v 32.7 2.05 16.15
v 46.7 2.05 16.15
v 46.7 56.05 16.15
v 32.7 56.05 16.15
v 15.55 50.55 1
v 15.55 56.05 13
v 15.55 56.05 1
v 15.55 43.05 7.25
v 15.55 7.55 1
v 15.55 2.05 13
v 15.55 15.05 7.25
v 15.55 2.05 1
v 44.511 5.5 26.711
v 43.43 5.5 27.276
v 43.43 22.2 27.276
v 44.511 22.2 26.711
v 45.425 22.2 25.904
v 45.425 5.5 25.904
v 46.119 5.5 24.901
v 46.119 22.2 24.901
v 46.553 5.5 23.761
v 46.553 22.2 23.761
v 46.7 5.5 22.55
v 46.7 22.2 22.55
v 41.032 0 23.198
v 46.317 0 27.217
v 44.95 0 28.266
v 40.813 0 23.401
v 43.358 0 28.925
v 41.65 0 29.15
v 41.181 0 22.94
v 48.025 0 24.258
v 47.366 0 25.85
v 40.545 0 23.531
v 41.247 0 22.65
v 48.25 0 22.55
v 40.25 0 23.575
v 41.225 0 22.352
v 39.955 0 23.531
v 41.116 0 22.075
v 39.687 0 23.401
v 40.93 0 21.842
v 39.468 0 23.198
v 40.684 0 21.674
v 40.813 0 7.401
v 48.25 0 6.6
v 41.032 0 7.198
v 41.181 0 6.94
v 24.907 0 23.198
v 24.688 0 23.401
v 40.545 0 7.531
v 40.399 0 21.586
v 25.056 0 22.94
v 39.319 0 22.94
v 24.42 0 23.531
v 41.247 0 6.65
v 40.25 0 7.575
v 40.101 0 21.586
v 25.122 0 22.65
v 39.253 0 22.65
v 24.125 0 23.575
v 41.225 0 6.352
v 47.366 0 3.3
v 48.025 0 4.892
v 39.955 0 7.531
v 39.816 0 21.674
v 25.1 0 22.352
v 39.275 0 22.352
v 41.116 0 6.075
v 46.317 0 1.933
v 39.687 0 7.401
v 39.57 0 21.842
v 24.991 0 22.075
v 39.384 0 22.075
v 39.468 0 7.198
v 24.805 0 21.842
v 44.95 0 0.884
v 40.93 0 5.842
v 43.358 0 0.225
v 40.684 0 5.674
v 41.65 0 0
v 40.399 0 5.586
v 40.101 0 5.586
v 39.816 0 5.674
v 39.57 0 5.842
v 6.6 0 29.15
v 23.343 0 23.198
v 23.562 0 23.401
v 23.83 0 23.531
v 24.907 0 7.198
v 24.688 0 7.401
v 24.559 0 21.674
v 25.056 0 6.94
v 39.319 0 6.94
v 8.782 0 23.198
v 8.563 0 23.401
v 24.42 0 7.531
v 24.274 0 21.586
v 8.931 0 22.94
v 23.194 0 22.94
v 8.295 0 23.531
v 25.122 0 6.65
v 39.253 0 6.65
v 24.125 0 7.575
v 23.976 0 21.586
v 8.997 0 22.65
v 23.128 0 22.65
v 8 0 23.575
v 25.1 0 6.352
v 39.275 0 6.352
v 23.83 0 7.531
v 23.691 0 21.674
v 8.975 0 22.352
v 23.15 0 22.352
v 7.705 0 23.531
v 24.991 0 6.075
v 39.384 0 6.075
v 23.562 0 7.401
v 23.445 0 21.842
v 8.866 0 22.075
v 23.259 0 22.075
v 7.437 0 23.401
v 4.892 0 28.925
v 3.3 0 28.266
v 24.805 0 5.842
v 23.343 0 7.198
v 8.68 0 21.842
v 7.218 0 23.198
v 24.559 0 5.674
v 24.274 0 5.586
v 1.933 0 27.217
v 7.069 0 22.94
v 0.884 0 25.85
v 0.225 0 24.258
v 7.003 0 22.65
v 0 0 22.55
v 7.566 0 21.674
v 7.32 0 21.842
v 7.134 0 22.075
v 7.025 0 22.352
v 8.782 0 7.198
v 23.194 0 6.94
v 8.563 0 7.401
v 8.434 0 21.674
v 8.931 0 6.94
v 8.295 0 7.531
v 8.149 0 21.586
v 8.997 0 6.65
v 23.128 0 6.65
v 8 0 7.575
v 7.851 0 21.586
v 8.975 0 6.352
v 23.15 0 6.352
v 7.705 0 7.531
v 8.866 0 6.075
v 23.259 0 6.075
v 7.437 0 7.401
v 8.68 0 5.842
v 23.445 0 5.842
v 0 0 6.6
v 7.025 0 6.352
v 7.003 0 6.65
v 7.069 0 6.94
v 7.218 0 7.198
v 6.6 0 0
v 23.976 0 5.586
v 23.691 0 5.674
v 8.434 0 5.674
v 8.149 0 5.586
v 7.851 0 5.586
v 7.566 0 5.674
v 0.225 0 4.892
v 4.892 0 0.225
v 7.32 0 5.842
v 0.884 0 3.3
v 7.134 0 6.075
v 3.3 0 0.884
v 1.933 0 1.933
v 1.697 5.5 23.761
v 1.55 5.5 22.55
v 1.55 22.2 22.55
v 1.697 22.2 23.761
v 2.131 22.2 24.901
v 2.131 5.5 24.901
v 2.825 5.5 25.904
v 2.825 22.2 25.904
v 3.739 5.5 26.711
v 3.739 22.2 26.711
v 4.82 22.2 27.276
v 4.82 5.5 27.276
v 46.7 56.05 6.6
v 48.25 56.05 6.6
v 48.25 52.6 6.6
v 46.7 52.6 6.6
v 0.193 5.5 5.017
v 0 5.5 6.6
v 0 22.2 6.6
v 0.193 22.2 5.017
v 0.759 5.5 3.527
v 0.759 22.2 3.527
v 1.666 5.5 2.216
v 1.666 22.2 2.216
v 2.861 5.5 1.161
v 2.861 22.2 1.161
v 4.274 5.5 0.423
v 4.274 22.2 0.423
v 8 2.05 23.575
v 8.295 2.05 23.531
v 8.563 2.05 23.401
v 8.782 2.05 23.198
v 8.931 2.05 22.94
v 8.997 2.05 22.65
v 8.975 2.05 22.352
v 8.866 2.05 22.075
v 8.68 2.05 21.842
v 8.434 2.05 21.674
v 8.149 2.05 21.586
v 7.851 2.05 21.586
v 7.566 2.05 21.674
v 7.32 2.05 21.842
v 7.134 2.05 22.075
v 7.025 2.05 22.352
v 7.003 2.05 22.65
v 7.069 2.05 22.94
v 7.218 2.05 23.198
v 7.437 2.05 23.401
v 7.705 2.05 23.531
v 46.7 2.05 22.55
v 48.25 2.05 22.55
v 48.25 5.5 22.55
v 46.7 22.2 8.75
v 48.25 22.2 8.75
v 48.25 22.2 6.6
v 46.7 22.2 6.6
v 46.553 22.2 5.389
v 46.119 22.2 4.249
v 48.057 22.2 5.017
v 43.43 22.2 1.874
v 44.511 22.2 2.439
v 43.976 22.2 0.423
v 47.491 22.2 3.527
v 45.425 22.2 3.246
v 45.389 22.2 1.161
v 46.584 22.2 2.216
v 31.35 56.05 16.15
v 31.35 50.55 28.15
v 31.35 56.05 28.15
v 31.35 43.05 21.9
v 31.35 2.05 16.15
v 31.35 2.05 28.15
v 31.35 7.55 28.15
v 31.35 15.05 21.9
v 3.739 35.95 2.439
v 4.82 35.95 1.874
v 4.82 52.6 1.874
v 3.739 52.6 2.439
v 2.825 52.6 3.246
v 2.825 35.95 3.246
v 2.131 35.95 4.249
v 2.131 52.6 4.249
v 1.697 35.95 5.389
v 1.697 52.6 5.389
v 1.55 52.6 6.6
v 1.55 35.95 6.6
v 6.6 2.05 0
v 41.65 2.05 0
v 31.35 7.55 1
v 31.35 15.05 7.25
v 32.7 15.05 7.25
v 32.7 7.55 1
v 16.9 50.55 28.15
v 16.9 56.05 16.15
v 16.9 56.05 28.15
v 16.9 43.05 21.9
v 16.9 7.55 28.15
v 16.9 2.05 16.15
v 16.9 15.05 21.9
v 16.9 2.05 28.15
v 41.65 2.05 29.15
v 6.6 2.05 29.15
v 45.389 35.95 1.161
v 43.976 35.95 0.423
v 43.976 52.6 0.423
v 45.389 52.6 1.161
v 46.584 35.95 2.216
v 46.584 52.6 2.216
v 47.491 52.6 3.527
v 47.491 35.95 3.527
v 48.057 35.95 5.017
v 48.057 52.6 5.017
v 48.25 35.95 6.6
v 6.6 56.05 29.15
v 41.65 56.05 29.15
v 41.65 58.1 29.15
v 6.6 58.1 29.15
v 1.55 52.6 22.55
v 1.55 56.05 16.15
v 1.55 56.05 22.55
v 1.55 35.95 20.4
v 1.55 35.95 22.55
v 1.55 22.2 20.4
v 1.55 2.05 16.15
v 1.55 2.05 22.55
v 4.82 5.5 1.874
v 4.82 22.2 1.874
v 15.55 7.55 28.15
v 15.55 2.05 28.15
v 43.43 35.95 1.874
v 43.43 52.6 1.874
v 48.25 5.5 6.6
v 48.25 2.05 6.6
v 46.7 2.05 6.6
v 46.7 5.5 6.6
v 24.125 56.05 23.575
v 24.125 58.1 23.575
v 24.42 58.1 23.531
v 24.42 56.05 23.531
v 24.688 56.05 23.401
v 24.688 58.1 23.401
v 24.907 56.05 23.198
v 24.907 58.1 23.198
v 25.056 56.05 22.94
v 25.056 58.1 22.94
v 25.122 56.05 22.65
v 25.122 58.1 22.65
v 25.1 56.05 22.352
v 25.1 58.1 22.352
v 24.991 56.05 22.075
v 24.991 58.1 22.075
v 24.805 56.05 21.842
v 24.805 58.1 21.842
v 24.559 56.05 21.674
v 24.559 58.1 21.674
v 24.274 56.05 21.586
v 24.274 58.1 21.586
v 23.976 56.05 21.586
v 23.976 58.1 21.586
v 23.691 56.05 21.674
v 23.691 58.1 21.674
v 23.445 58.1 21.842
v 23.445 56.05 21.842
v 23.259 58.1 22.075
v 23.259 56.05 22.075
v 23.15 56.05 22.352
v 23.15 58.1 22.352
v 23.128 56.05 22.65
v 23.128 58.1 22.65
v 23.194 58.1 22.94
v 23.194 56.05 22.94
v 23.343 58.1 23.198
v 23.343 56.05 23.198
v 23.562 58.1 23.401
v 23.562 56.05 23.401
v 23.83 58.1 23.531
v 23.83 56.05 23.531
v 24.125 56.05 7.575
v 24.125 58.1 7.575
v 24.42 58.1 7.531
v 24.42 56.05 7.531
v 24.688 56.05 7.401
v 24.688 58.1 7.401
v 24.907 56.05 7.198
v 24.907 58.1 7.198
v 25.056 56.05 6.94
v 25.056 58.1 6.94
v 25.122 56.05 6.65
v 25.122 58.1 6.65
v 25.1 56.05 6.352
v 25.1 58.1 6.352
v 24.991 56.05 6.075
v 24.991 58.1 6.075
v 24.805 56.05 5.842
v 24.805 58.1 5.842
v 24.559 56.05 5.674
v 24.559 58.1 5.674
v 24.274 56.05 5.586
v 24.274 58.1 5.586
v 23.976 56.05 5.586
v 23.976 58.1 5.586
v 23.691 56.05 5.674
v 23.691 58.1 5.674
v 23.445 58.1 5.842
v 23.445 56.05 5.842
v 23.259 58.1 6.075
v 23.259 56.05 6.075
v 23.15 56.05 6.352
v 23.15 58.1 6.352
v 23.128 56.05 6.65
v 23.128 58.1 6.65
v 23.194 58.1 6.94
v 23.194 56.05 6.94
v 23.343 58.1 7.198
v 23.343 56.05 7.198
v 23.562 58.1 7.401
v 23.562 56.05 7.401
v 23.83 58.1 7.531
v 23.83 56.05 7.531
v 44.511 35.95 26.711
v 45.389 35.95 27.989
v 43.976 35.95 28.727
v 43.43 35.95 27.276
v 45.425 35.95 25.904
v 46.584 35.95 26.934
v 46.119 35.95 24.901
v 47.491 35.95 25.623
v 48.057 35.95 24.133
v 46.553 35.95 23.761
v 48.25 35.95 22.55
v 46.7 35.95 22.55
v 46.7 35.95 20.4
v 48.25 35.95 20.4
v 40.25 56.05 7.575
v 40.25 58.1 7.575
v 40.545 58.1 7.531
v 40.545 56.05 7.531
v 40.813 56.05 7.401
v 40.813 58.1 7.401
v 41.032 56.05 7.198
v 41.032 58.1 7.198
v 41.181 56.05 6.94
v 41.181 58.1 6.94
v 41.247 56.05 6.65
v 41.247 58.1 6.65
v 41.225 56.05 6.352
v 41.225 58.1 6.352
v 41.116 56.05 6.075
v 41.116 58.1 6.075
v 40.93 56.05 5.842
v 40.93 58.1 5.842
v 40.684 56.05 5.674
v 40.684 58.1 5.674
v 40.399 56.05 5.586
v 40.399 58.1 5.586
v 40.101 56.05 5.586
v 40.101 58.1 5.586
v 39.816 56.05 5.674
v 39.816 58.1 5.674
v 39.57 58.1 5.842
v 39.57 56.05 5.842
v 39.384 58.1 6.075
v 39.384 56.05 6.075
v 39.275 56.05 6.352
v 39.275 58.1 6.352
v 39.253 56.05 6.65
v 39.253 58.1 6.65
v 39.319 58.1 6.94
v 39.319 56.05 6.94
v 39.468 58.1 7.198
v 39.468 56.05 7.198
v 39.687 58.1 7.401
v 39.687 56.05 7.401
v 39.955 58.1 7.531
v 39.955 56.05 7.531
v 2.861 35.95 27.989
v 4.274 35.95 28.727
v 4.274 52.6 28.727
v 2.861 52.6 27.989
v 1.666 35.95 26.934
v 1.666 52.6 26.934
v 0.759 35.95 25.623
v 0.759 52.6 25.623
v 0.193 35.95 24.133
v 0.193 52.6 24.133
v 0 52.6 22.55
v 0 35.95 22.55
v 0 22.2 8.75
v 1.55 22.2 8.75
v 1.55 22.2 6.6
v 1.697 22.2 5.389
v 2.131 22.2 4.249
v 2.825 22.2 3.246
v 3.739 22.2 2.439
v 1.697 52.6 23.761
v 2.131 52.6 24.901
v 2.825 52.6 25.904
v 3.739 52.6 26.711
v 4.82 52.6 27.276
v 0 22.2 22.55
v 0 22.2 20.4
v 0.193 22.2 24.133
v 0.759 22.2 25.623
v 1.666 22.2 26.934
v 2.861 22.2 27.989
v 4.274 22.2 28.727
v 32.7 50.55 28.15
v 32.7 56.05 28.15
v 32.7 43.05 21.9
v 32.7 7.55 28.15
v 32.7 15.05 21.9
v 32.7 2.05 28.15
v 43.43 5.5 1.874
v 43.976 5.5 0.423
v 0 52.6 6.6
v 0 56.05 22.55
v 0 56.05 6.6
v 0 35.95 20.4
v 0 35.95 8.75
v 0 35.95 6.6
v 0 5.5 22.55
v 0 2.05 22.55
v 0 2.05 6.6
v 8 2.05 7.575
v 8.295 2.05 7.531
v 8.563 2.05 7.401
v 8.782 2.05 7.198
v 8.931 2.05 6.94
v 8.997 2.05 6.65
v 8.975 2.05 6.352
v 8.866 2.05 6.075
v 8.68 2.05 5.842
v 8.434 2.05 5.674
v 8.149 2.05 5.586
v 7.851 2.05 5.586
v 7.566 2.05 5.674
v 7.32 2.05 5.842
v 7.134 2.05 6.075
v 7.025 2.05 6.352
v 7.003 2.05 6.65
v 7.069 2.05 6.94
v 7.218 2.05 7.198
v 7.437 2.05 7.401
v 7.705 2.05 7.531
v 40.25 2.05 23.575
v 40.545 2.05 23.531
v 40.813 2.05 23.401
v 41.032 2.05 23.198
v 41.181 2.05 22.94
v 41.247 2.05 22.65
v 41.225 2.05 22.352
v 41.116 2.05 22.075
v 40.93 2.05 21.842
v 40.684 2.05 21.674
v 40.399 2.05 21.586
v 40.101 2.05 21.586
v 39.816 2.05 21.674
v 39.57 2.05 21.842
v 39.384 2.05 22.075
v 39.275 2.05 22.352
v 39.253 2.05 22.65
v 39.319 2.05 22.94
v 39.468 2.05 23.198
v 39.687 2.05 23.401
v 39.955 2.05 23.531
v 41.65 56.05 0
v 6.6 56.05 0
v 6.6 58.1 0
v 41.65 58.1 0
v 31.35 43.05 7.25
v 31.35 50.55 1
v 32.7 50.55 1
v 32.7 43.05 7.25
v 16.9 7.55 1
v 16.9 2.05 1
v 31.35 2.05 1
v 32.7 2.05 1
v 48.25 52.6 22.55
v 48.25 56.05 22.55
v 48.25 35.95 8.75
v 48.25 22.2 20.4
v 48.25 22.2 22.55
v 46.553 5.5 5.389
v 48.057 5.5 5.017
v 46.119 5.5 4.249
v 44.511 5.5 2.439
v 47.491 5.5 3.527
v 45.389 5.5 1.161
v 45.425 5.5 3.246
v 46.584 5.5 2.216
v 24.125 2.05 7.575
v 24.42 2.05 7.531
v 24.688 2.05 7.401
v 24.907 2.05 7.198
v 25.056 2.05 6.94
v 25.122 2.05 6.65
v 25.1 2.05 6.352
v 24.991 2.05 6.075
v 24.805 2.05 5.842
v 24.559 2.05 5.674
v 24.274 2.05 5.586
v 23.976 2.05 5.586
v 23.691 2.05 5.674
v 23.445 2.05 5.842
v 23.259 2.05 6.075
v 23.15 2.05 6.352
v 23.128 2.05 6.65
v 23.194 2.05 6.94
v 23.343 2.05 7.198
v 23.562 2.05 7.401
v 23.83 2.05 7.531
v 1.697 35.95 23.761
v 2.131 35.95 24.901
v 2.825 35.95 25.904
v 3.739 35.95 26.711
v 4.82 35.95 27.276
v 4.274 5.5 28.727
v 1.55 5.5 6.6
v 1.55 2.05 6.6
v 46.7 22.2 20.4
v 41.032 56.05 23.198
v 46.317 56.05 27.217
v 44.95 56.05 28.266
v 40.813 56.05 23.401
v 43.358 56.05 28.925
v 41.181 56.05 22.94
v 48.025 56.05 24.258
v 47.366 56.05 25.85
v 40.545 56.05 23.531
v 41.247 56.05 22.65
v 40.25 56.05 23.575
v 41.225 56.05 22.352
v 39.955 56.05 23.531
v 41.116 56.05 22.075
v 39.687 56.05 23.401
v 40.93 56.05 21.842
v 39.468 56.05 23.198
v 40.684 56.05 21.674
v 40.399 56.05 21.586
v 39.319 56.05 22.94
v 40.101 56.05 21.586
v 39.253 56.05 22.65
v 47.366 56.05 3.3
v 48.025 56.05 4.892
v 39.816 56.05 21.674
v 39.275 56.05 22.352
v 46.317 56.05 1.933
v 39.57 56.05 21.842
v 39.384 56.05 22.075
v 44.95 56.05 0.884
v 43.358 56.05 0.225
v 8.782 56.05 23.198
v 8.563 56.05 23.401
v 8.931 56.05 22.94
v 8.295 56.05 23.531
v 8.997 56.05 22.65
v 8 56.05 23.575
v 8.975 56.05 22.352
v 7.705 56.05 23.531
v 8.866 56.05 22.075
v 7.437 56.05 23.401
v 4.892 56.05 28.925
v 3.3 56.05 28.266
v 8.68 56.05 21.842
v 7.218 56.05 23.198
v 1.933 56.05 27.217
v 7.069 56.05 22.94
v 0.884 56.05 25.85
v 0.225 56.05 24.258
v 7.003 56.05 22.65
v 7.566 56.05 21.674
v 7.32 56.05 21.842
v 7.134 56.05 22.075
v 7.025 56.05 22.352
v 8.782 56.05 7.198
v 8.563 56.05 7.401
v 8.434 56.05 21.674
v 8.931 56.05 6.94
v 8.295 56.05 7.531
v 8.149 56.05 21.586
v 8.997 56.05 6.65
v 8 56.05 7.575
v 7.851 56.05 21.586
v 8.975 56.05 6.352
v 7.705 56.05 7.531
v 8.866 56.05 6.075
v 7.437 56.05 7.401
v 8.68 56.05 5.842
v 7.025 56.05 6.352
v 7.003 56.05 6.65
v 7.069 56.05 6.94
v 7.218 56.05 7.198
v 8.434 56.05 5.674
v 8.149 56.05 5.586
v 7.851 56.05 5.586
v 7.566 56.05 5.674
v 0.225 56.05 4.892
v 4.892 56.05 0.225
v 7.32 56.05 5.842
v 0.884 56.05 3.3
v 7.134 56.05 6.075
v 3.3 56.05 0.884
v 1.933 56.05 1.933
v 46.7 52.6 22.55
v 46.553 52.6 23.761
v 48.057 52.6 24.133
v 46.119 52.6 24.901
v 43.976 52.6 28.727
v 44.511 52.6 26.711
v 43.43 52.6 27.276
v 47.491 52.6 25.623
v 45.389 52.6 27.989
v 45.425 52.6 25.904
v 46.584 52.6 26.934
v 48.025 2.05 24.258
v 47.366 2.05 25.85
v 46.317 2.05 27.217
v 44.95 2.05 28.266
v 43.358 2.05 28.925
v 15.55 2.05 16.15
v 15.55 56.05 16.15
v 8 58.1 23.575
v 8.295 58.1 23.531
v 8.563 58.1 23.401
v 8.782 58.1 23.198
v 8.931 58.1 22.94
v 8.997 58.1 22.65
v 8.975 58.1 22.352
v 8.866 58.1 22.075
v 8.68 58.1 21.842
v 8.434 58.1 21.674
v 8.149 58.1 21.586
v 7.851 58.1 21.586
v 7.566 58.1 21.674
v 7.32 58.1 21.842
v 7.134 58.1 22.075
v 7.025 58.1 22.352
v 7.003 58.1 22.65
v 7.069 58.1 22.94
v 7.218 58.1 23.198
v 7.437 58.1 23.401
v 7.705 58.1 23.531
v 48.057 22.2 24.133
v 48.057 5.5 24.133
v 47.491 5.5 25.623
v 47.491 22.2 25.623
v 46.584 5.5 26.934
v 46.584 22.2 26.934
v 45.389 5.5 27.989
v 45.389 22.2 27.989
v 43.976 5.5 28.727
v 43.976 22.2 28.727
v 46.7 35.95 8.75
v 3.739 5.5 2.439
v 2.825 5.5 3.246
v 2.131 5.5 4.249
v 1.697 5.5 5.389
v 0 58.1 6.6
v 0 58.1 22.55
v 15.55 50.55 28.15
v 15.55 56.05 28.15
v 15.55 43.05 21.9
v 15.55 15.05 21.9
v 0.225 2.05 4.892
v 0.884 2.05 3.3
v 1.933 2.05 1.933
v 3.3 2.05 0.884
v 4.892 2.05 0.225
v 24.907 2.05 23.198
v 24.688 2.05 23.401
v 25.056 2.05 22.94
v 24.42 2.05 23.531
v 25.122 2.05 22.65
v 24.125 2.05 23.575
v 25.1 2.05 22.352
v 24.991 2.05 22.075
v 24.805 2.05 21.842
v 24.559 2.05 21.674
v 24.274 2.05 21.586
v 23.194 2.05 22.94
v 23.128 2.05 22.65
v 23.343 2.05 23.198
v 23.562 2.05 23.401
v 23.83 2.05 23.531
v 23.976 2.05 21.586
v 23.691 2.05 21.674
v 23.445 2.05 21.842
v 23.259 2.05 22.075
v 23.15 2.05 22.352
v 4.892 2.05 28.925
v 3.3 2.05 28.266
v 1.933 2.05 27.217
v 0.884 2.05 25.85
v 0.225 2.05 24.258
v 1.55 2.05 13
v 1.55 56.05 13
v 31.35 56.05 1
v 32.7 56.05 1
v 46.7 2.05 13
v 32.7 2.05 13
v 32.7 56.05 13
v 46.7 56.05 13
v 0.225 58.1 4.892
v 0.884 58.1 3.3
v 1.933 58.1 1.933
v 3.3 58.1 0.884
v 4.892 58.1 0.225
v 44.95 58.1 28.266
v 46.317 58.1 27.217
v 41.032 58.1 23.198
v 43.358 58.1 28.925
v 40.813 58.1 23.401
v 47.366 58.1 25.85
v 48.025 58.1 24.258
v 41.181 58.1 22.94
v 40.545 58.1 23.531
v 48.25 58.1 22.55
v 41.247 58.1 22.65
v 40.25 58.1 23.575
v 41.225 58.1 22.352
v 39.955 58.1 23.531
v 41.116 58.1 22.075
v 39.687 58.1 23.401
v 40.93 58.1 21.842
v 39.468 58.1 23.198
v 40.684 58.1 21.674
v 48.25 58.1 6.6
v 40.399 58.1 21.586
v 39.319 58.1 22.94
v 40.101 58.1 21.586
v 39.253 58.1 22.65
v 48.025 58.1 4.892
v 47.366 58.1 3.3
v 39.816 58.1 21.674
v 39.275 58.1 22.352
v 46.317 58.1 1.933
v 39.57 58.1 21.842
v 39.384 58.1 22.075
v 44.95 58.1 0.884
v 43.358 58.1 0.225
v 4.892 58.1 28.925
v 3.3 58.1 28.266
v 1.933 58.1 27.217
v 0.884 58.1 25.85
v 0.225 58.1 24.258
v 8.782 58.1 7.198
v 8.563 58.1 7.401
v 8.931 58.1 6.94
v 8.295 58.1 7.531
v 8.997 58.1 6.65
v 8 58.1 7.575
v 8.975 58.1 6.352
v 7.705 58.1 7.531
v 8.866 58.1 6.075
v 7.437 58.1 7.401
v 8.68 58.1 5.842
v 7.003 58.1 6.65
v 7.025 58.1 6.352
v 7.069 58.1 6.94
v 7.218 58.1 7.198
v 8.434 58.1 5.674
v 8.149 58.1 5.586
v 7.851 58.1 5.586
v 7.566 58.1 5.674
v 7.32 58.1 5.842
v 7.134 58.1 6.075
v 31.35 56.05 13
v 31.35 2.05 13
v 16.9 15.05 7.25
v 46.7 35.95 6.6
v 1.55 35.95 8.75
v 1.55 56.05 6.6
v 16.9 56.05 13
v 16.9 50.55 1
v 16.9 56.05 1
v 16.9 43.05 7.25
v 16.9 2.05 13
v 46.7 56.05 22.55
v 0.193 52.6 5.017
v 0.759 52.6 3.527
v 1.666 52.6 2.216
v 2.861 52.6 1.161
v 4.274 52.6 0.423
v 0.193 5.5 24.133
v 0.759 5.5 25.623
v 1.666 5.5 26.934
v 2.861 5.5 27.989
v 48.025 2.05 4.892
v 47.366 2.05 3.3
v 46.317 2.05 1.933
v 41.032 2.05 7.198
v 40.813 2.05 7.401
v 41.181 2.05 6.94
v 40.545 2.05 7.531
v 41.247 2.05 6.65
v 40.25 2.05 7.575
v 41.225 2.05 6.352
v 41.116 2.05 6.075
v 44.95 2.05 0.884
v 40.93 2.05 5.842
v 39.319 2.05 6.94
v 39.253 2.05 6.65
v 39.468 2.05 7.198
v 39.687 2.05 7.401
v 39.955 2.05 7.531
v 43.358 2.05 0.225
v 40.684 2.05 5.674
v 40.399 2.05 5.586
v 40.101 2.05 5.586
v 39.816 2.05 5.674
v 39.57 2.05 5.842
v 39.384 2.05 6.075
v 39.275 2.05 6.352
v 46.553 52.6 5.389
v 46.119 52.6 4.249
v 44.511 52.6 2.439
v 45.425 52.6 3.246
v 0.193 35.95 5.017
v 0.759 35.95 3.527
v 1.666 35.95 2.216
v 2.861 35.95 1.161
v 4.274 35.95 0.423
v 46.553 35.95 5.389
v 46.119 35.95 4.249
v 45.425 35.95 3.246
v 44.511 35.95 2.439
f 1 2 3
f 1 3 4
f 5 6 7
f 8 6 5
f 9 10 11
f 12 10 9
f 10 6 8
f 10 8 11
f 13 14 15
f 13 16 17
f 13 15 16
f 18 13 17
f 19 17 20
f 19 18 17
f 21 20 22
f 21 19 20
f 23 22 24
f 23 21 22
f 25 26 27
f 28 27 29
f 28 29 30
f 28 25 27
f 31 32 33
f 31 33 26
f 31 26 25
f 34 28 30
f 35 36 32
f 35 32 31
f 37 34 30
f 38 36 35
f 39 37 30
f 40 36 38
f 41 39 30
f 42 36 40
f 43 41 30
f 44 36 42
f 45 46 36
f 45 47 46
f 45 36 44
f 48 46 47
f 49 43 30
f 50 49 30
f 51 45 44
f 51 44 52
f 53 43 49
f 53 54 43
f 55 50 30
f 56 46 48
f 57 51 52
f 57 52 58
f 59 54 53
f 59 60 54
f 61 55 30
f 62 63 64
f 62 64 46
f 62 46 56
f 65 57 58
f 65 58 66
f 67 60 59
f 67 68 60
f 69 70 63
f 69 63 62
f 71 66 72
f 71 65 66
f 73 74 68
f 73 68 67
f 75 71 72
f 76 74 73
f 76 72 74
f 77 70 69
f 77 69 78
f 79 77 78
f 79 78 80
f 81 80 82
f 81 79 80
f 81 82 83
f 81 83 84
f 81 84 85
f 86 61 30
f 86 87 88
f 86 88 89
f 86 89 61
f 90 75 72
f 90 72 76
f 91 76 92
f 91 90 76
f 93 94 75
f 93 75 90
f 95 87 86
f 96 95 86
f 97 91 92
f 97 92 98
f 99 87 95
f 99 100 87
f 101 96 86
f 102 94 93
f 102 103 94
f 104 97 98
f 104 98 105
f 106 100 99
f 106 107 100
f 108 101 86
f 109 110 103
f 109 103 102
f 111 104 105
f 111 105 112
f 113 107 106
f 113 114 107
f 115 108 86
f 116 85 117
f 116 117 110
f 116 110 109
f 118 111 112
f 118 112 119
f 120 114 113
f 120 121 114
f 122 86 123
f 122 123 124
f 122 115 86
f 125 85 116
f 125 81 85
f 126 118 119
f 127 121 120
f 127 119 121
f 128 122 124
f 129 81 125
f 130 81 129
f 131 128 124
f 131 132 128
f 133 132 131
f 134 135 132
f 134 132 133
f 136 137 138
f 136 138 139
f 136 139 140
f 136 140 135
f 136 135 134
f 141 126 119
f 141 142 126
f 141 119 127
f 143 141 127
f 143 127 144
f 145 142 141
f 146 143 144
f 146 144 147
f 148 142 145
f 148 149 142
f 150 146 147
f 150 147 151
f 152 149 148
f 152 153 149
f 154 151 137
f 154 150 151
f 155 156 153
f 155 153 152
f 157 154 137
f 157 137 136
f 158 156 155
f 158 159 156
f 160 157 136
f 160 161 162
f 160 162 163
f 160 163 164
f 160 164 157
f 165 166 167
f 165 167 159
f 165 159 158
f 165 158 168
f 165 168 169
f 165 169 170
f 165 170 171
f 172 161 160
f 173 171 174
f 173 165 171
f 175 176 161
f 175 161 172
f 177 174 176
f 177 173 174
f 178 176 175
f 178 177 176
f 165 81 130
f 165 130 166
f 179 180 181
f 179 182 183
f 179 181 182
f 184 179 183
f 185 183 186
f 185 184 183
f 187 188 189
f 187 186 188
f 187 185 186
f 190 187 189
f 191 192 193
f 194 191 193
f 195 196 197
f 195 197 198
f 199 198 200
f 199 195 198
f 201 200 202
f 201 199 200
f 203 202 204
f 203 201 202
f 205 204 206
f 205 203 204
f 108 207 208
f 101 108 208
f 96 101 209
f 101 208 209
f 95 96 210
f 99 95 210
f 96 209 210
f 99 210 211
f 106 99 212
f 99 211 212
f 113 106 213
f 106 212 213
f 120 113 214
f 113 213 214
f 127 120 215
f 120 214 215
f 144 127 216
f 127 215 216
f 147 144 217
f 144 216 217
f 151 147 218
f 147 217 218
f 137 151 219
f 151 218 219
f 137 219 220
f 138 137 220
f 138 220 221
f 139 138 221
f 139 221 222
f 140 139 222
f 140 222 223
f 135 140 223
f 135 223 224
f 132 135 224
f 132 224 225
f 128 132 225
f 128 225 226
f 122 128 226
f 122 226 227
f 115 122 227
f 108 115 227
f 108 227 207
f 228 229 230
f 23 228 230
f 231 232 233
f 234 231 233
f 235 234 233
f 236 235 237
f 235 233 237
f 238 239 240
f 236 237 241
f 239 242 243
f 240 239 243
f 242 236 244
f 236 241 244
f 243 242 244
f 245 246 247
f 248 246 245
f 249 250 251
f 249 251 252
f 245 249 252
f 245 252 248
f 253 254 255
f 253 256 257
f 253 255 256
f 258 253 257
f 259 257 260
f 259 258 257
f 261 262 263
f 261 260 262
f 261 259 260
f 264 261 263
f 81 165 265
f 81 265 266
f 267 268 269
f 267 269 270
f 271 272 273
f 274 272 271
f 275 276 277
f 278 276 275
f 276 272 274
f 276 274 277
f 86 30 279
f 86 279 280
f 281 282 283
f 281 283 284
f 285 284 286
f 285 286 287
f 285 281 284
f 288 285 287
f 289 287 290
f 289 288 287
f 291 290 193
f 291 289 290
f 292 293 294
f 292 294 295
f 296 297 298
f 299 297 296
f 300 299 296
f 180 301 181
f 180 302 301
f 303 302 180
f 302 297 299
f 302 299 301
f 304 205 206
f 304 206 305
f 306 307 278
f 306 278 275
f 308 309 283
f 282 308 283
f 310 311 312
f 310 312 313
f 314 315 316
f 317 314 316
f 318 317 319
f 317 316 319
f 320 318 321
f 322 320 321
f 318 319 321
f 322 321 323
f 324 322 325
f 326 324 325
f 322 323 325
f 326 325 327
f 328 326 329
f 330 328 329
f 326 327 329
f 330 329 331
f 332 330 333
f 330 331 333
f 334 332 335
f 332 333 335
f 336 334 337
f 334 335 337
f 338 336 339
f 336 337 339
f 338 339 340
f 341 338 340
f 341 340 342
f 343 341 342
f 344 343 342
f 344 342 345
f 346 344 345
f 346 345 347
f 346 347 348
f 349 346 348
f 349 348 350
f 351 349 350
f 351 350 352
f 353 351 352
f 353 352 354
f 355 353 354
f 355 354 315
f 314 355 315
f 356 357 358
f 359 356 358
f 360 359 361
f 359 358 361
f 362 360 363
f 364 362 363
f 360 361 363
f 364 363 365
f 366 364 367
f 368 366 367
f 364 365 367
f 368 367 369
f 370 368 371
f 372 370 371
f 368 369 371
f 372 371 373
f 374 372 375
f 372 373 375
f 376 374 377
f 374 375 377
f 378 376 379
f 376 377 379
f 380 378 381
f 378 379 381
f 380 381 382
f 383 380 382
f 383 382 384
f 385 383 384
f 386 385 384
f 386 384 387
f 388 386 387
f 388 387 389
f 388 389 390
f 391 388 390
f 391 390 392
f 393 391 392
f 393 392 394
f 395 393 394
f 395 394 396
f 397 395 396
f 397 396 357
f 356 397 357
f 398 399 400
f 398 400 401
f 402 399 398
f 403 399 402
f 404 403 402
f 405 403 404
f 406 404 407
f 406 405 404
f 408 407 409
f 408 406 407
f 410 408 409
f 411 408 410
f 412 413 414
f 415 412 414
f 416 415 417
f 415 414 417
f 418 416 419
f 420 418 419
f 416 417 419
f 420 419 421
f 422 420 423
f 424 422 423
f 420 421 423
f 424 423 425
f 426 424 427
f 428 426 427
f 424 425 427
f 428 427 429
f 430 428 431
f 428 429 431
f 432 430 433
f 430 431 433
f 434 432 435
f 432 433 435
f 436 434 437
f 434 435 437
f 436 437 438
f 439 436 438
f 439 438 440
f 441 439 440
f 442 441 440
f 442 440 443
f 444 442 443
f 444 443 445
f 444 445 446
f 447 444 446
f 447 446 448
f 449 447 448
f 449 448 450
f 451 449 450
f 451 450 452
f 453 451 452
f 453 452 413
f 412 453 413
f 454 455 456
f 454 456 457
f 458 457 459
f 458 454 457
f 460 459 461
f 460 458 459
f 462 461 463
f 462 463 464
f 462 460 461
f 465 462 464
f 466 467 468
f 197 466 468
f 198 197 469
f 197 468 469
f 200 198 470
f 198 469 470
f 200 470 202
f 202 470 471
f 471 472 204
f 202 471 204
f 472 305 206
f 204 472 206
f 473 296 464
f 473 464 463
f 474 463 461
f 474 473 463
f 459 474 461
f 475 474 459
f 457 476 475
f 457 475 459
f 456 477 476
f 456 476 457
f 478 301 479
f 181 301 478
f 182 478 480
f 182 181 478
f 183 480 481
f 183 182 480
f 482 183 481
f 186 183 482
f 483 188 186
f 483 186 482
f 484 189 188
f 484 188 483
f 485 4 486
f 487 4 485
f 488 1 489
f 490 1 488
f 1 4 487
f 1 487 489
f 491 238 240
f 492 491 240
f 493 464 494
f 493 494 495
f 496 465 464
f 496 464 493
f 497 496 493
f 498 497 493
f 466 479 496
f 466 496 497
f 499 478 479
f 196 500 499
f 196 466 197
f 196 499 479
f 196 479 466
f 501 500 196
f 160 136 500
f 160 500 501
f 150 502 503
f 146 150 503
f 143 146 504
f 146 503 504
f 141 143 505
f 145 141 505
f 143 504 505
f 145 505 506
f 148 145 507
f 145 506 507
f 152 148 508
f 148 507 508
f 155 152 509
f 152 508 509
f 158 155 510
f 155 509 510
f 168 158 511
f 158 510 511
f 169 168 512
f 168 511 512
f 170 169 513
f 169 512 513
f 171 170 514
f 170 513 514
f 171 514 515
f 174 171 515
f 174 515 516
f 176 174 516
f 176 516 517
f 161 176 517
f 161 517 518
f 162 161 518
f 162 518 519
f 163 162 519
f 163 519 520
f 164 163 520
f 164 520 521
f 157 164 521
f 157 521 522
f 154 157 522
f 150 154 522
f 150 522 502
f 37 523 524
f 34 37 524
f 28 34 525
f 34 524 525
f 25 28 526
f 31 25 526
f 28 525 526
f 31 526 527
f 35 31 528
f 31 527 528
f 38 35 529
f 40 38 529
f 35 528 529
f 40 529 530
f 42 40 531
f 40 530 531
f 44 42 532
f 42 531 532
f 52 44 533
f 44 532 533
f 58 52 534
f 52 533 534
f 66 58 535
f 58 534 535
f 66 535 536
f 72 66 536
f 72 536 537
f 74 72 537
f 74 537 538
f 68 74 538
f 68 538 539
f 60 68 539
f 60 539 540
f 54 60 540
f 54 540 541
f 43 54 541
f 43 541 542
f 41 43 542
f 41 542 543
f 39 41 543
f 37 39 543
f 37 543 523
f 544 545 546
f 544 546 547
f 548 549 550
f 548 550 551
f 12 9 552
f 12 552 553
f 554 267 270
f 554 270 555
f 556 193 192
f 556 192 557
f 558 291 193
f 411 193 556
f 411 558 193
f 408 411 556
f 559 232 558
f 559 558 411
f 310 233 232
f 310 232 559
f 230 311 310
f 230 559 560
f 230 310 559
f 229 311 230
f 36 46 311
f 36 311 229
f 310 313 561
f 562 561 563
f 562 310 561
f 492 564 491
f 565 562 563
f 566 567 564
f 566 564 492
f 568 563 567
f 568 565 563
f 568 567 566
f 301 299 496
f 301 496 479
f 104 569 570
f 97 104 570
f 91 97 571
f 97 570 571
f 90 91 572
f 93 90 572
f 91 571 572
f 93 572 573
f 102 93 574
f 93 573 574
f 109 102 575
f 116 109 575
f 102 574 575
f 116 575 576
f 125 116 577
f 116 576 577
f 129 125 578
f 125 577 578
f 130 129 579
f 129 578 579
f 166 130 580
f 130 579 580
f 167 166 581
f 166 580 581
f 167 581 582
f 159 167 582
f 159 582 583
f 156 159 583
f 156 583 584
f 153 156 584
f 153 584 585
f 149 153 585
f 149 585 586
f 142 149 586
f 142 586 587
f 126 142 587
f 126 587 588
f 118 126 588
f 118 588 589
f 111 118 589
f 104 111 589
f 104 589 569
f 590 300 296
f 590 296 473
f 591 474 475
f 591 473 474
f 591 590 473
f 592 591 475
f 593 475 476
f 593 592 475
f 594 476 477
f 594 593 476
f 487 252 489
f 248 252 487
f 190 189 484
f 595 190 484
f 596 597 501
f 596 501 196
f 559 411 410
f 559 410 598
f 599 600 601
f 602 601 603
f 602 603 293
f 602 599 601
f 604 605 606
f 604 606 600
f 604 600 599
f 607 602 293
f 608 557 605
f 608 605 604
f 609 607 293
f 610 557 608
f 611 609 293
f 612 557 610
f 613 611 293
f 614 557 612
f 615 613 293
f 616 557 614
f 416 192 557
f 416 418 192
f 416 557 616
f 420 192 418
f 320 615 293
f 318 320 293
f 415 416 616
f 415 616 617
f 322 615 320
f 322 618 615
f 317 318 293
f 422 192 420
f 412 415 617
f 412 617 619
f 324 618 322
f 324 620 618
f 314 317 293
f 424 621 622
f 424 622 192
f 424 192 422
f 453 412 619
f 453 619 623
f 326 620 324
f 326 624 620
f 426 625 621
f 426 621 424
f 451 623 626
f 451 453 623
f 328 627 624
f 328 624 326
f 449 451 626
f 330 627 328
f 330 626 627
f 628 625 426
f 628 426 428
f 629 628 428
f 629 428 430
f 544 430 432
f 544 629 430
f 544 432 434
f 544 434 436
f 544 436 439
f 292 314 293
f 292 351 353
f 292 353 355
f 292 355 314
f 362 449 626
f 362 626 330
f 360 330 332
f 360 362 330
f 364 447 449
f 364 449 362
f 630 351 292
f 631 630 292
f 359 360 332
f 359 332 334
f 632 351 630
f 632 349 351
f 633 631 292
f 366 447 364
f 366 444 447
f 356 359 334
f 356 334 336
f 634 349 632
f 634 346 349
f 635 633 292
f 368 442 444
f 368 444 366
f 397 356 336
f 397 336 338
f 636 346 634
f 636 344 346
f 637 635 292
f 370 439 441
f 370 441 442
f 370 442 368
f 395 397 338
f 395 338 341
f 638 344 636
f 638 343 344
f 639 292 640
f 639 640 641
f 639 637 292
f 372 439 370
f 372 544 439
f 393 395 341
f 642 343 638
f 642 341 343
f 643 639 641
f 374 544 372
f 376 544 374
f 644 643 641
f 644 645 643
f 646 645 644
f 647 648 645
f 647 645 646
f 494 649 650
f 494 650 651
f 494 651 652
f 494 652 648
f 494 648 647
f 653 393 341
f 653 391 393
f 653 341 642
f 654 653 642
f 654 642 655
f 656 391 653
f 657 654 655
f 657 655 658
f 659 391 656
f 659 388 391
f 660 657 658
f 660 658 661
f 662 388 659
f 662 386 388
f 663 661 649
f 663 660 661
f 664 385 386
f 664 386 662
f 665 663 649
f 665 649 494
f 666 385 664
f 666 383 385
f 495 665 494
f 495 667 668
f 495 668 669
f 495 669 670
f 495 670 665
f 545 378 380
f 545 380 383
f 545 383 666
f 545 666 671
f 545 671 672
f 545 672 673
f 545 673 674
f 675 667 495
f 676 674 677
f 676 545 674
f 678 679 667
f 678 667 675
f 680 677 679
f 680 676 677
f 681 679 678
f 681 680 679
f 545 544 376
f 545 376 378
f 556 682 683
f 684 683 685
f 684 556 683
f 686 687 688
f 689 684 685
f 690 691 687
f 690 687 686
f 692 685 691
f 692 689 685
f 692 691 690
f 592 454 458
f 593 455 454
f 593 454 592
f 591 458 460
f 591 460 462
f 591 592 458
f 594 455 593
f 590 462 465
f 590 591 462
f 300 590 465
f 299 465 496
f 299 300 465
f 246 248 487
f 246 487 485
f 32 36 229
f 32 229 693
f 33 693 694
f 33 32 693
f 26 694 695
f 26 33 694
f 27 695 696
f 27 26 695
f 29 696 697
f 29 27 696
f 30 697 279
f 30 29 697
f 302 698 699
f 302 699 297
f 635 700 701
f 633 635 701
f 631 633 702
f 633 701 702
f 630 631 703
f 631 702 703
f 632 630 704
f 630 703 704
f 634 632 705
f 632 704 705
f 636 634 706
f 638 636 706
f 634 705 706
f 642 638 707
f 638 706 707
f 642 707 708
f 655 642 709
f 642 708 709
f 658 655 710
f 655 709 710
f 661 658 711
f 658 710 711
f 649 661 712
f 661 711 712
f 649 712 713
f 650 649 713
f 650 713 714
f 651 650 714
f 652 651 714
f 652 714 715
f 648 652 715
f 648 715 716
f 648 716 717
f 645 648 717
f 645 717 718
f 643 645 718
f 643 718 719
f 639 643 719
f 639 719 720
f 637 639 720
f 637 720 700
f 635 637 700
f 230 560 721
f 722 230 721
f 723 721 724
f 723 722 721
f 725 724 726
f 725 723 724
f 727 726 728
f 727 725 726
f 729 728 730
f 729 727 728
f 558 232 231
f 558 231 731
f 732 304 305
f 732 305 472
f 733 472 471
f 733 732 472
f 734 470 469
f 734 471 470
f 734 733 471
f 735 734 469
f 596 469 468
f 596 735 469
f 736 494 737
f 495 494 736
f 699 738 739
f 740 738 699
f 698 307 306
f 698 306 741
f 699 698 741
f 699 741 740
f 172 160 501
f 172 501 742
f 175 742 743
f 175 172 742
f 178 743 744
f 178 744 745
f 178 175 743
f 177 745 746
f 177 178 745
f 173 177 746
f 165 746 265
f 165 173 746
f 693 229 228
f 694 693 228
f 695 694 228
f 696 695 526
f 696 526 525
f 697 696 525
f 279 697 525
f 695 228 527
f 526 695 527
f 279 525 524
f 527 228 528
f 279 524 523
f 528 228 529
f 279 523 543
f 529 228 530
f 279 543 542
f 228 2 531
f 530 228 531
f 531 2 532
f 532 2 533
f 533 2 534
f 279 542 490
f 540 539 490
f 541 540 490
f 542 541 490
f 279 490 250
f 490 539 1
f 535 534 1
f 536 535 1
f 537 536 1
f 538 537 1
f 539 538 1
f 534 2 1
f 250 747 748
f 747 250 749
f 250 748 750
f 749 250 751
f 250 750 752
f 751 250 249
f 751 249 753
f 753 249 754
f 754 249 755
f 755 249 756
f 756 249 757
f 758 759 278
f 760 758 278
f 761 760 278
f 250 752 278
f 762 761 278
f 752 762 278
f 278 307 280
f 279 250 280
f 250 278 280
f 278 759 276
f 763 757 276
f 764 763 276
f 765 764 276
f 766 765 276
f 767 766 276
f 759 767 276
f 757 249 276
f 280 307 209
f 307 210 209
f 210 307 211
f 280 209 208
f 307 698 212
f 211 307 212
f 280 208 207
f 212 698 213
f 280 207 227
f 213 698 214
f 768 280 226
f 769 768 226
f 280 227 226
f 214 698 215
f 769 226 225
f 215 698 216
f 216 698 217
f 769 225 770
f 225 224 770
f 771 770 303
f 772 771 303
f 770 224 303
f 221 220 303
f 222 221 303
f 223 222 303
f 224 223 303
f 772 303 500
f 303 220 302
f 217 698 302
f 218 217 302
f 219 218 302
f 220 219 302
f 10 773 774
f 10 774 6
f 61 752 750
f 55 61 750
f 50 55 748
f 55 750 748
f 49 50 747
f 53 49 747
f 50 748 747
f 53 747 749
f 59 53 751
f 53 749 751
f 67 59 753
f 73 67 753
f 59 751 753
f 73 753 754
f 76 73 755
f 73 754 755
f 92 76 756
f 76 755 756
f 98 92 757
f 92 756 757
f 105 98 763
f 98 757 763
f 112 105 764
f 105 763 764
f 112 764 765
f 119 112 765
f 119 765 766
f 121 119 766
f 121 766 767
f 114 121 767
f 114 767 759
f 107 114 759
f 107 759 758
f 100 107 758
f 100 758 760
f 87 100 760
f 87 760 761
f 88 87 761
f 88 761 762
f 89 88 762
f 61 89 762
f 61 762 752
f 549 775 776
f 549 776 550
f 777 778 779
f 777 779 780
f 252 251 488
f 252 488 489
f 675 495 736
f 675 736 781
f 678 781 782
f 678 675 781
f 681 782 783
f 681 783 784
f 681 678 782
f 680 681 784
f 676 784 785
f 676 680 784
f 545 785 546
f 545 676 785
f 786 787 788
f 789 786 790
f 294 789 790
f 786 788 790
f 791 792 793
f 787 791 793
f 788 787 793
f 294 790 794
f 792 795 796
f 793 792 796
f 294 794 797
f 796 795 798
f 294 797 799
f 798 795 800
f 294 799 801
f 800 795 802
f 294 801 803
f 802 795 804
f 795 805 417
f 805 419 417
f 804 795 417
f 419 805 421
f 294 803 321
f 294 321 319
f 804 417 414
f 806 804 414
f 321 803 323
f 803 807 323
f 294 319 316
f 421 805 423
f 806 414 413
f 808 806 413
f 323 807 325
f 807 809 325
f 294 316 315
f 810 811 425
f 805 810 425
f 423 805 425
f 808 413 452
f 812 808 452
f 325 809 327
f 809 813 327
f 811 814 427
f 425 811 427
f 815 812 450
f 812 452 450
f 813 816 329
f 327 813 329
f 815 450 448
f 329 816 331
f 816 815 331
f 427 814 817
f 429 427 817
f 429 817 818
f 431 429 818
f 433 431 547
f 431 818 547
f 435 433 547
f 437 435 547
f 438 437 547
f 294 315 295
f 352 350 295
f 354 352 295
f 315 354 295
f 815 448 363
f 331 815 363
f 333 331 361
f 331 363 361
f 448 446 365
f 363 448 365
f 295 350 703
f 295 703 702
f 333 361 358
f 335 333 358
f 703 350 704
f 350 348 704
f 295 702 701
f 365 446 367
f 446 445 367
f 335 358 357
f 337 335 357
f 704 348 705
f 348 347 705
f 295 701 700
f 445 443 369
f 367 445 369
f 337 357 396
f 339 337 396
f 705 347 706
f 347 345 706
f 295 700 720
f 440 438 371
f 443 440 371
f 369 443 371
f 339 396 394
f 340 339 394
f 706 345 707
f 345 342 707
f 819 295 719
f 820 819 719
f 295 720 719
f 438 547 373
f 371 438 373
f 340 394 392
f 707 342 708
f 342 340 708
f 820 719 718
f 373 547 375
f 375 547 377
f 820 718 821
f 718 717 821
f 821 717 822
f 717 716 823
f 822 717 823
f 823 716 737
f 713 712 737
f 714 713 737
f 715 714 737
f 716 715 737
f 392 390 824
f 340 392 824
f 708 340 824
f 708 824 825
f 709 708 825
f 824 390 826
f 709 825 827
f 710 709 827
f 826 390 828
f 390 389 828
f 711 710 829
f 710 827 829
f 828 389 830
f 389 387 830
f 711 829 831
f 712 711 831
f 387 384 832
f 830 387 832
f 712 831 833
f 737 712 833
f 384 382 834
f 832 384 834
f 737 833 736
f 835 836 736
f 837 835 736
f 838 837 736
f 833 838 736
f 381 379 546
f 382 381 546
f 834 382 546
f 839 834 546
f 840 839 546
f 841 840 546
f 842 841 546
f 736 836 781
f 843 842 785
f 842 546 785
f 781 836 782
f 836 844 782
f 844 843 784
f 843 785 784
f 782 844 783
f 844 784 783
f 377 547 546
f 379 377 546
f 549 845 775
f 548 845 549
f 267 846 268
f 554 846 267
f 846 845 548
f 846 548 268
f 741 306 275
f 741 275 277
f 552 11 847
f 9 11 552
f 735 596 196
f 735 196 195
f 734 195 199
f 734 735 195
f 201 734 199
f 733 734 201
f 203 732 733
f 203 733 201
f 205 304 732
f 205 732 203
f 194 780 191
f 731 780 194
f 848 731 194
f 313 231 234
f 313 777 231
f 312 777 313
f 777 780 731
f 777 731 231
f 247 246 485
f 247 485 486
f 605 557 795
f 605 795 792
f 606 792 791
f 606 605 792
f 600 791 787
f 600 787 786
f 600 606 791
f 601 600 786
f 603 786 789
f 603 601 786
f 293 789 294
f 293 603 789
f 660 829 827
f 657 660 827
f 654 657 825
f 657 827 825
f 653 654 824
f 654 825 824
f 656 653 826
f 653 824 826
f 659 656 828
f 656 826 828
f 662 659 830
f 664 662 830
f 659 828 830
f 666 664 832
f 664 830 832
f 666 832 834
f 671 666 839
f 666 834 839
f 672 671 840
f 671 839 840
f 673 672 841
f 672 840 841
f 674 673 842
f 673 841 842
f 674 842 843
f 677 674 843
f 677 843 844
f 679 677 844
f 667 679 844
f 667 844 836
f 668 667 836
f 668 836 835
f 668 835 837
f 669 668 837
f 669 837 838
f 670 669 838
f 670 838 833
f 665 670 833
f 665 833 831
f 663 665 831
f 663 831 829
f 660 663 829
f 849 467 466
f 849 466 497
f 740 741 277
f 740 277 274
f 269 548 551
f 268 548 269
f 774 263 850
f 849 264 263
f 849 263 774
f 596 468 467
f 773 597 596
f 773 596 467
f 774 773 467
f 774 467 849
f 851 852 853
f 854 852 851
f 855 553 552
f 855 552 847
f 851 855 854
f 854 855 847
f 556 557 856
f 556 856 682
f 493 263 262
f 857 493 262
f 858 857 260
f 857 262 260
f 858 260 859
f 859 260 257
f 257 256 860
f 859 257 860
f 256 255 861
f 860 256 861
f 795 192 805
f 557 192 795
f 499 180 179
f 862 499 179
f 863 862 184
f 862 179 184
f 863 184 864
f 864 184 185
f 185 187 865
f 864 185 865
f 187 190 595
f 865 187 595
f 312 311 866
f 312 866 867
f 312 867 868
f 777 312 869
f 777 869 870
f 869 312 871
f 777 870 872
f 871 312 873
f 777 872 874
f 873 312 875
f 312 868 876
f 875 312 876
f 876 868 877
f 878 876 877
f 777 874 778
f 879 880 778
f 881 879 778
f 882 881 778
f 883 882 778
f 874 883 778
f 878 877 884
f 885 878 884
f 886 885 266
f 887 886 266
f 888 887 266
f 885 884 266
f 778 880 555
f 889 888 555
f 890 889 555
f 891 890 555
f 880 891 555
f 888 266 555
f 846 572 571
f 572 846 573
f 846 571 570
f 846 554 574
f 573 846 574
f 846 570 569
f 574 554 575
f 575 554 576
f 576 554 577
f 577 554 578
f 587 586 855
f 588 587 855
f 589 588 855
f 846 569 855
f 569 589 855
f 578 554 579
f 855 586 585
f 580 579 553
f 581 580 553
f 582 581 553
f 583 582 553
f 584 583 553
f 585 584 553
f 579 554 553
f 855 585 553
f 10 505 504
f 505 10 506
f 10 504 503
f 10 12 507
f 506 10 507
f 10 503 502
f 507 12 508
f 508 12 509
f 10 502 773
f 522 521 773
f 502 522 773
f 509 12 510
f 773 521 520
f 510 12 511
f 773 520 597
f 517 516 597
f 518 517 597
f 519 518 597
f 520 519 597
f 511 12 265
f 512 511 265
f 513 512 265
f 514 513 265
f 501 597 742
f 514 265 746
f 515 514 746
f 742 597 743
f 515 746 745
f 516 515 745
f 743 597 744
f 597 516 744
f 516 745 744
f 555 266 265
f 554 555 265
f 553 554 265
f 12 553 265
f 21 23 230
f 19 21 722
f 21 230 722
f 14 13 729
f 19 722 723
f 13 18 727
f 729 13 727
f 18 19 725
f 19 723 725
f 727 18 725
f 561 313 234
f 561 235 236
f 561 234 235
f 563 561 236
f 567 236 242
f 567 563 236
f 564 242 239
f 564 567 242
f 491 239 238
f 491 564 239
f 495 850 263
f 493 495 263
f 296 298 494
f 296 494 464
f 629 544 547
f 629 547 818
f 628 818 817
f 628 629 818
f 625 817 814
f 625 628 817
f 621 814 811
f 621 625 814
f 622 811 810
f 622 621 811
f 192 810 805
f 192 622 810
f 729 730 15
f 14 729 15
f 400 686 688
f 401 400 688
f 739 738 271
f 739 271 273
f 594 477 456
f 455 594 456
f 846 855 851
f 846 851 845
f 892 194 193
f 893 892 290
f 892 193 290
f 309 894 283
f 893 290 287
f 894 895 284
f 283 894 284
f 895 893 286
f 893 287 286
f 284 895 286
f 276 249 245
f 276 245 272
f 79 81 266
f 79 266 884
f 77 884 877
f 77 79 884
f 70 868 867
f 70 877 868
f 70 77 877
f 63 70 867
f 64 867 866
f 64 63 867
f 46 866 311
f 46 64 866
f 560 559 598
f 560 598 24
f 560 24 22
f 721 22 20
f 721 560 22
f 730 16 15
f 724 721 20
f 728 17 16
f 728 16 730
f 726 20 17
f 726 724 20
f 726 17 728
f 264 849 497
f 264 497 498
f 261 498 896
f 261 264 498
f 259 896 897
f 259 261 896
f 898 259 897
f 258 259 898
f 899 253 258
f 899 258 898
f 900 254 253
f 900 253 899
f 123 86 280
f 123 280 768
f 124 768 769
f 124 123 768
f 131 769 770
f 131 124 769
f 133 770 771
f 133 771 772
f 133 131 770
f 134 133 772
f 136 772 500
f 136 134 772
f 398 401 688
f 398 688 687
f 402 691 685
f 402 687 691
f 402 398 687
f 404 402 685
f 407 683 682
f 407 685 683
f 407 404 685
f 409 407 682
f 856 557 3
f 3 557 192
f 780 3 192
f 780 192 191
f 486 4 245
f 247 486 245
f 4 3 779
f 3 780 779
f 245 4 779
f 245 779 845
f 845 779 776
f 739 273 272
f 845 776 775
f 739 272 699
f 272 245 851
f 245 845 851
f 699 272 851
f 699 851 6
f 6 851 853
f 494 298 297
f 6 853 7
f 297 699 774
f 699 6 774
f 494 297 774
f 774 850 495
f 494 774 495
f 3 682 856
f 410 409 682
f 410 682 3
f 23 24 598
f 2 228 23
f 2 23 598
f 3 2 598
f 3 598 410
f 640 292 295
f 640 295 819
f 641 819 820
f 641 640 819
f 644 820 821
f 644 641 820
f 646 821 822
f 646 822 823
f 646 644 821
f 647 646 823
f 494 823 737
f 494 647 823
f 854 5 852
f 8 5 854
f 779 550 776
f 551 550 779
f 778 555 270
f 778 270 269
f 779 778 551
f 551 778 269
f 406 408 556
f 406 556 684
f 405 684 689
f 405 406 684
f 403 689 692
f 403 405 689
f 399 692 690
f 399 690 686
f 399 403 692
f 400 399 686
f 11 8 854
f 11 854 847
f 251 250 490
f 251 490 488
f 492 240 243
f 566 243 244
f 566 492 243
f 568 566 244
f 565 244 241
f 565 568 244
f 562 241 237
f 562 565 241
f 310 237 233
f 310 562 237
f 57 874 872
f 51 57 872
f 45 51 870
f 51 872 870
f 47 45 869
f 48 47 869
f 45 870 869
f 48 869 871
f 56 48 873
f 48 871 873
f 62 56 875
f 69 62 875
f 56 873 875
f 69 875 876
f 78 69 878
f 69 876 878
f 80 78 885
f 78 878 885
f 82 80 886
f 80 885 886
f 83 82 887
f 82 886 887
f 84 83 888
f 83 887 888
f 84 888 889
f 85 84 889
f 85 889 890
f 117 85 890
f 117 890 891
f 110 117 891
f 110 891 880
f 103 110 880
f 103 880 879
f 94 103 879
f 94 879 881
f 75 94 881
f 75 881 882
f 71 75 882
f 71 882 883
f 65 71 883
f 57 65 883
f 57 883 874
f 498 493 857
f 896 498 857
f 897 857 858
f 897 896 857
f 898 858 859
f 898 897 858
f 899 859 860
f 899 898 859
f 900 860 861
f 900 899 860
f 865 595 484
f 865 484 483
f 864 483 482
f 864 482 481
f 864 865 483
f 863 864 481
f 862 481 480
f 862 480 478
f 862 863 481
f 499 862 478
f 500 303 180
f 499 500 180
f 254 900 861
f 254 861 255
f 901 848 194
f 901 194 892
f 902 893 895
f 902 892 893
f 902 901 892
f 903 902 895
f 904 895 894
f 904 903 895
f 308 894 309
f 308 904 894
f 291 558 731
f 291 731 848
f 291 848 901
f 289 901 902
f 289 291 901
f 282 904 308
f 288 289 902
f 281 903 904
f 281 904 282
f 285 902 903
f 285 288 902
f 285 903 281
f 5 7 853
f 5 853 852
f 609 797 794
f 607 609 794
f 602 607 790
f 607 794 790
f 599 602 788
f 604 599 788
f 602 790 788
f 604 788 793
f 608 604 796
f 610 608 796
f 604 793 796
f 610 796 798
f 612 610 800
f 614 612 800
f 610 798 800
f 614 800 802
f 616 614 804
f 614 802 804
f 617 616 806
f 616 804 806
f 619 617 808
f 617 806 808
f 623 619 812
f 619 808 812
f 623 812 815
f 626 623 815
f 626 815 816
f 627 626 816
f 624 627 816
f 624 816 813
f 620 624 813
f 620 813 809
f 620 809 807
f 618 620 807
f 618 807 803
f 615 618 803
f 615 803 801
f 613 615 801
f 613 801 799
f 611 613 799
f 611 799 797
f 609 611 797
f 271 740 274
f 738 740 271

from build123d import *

# Parameters (mm, degrees)
BOSS_EXTRUDE1_DEPTH     = 2.05
BOSS_EXTRUDE2_DEPTH     = 54
BOSS_EXTRUDE9_START     = 56.05
BOSS_EXTRUDE9_DEPTH     = 2.05
SKETCH3_W               = 23.613559859
SKETCH3_H               = 13.75
CUT_EXTRUDE2_DEPTH      = 12.5
CUT_EXTRUDE4_START      = -40
SKETCH3_2_W             = 23.613559859
SKETCH3_2_H             = 13.75
CUT_EXTRUDE4_DEPTH      = 12.5
CUT_EXTRUDE5_DEPTH      = 22.5
CUT_EXTRUDE5_DEPTH_BACK = 5
SKETCH8_R               = 1
CUT_EXTRUDE6_DEPTH      = 85


with BuildPart() as part:
    # Sketch1 → Boss-Extrude1 (new body)
    with BuildSketch(Plane(origin=(0, 0, 0), x_dir=(1, 0, 0), z_dir=(0, 1, 0))):
        with BuildLine():
            Line((6.6, 0), (41.65, 0))
            ThreePointArc((41.65, 0), (46.316904756, -1.933095244), (48.25, -6.6))
            Line((48.25, -6.6), (48.25, -22.55))
            ThreePointArc((48.25, -22.55), (46.316904756, -27.216904756), (41.65, -29.15))
            Line((41.65, -29.15), (6.6, -29.15))
            ThreePointArc((6.6, -29.15), (1.933095244, -27.216904756), (0, -22.55))
            Line((0, -22.55), (0, -6.6))
            ThreePointArc((0, -6.6), (1.933095244, -1.933095244), (6.6, 0))
        make_face()
    extrude(amount=BOSS_EXTRUDE1_DEPTH)

    # Sketch2 → Boss-Extrude2 (add)
    with BuildSketch(Plane(origin=(0, 2.05, 0), x_dir=(1, 0, 0), z_dir=(0, 1, 0))):
        with BuildLine():
            Line((16.9, -13), (31.35, -13))
            Line((31.35, -13), (31.35, 0))
            Line((31.35, 0), (32.7, 0))
            Line((32.7, 0), (32.7, -13))
            Line((32.7, -13), (46.7, -13))
            Line((46.7, -13), (46.7, -6.6))
            ThreePointArc((46.7, -6.6), (45.802684456, -3.726376536), (43.429619084, -1.873959806))
            Line((43.429619084, -1.873959806), (43.975838803, -0.423393014))
            ThreePointArc((43.975838803, -0.423393014), (47.077270774, -2.844373295), (48.25, -6.6))
            Line((48.25, -6.6), (48.25, -13))
            Line((48.25, -13), (48.25, -16.15))
            Line((48.25, -16.15), (48.25, -22.55))
            ThreePointArc((48.25, -22.55), (47.077270774, -26.305626705), (43.975838803, -28.726606986))
            Line((43.975838803, -28.726606986), (43.429619084, -27.276040194))
            ThreePointArc((43.429619084, -27.276040194), (45.802684456, -25.423623464), (46.7, -22.55))
            Line((46.7, -22.55), (46.7, -16.15))
            Line((46.7, -16.15), (32.7, -16.15))
            Line((32.7, -16.15), (32.7, -29.15))
            Line((32.7, -29.15), (31.35, -29.15))
            Line((31.35, -29.15), (31.35, -16.15))
            Line((31.35, -16.15), (16.9, -16.15))
            Line((16.9, -16.15), (16.9, -29.15))
            Line((16.9, -29.15), (15.55, -29.15))
            Line((15.55, -29.15), (15.55, -16.15))
            Line((15.55, -16.15), (1.55, -16.15))
            Line((1.55, -16.15), (1.55, -22.55))
            ThreePointArc((1.55, -22.55), (2.447315544, -25.423623464), (4.820380916, -27.276040194))
            Line((4.820380916, -27.276040194), (4.274161197, -28.726606986))
            ThreePointArc((4.274161197, -28.726606986), (1.172729226, -26.305626705), (0, -22.55))
            Line((0, -22.55), (0, -16.15))
            Line((0, -16.15), (0, -13))
            Line((0, -13), (0, -6.6))
            ThreePointArc((0, -6.6), (1.172729226, -2.844373295), (4.274161197, -0.423393014))
            Line((4.274161197, -0.423393014), (4.820380916, -1.873959806))
            ThreePointArc((4.820380916, -1.873959806), (2.447315544, -3.726376536), (1.55, -6.6))
            Line((1.55, -6.6), (1.55, -13))
            Line((1.55, -13), (15.55, -13))
            Line((15.55, -13), (15.55, 0))
            Line((15.55, 0), (16.9, 0))
            Line((16.9, 0), (16.9, -13))
        make_face()
    extrude(amount=BOSS_EXTRUDE2_DEPTH)

    # Sketch3 → Cut-Extrude2 (cut)
    with BuildSketch(Plane(origin=(48.25, 0, 0), x_dir=(0, 0, -1), z_dir=(1, 0, 0))):
        Polygon((-6.6, 56.05), (-6.6, 52.6), (7.429897114, 52.6), (10.879897114, 56.05), align=None)
        with Locations((3.05677993, 29.075)):
            Rectangle(SKETCH3_W, SKETCH3_H)
        Polygon((10.879897114, 2.05), (-6.6, 2.05), (-6.6, 5.5), (7.429897114, 5.5), align=None)
        Polygon((-22.55, 2.05), (-22.55, 5.5), (-36.579897114, 5.5), (-40.029897114, 2.05), align=None)
        Polygon((-40.029897114, 56.05), (-22.55, 56.05), (-22.55, 52.6), (-36.579897114, 52.6), align=None)
        Polygon((-20.4, 22.2), (-42.823196098, 22.2), (-44.013559859, 35.95), (-20.4, 35.95), align=None)
    extrude(amount=-CUT_EXTRUDE2_DEPTH, mode=Mode.SUBTRACT)

    # Sketch3<2> → Cut-Extrude4 (cut)
    with BuildSketch(Plane(origin=(48.25, 0, 0), x_dir=(0, 0, -1), z_dir=(1, 0, 0)).offset(CUT_EXTRUDE4_START)):
        Polygon((-6.6, 56.05), (-6.6, 52.6), (7.429897114, 52.6), (10.879897114, 56.05), align=None)
        with Locations((3.05677993, 29.075)):
            Rectangle(SKETCH3_2_W, SKETCH3_2_H)
        Polygon((10.879897114, 2.05), (-6.6, 2.05), (-6.6, 5.5), (7.429897114, 5.5), align=None)
        Polygon((-22.55, 2.05), (-22.55, 5.5), (-36.579897114, 5.5), (-40.029897114, 2.05), align=None)
        Polygon((-40.029897114, 56.05), (-22.55, 56.05), (-22.55, 52.6), (-36.579897114, 52.6), align=None)
        Polygon((-20.4, 22.2), (-42.823196098, 22.2), (-44.013559859, 35.95), (-20.4, 35.95), align=None)
    extrude(amount=-CUT_EXTRUDE4_DEPTH, mode=Mode.SUBTRACT)

    # Sketch4 → Cut-Extrude5 (cut, two sides: drawn at the far end of the back side and taken through both)
    with BuildSketch(Plane(origin=(16.9, 0, 0), x_dir=(0, 0, -1), z_dir=(1, 0, 0)).offset(-CUT_EXTRUDE5_DEPTH_BACK)):
        Polygon((-29.15, 2.05), (-28.15, 2.05), (-28.15, 7.55), (-21.9, 15.05), (-21.9, 43.05), (-28.15, 50.55), (-28.15, 56.05), (-29.15, 56.05), align=None)
        Polygon((0, 56.05), (-1, 56.05), (-1, 50.55), (-7.25, 43.05), (-7.25, 15.05), (-1, 7.55), (-1, 2.05), (0, 2.05), align=None)
    extrude(amount=CUT_EXTRUDE5_DEPTH + CUT_EXTRUDE5_DEPTH_BACK, mode=Mode.SUBTRACT)


with BuildPart() as body_2:
    # Sketch1<6> → Boss-Extrude9 (new body)
    with BuildSketch(Plane(origin=(0, 0, 0), x_dir=(1, 0, 0), z_dir=(0, 1, 0)).offset(BOSS_EXTRUDE9_START)):
        with BuildLine():
            Line((6.6, 0), (41.65, 0))
            ThreePointArc((41.65, 0), (46.316904756, -1.933095244), (48.25, -6.6))
            Line((48.25, -6.6), (48.25, -22.55))
            ThreePointArc((48.25, -22.55), (46.316904756, -27.216904756), (41.65, -29.15))
            Line((41.65, -29.15), (6.6, -29.15))
            ThreePointArc((6.6, -29.15), (1.933095244, -27.216904756), (0, -22.55))
            Line((0, -22.55), (0, -6.6))
            ThreePointArc((0, -6.6), (1.933095244, -1.933095244), (6.6, 0))
        make_face()
    extrude(amount=BOSS_EXTRUDE9_DEPTH)


with BuildPart() as cut_extrude6_tool:
    # Sketch8 → Cut-Extrude6 (new body)
    with BuildSketch(Plane(origin=(0, 58.1, 0), x_dir=(1, 0, 0), z_dir=(0, 1, 0))):
        with Locations((8, -6.575)):
            Circle(SKETCH8_R)
        with Locations((24.125, -6.575)):
            Circle(SKETCH8_R)
        with Locations((40.25, -6.575)):
            Circle(SKETCH8_R)
        with Locations((40.25, -22.575)):
            Circle(SKETCH8_R)
        with Locations((24.125, -22.575)):
            Circle(SKETCH8_R)
        with Locations((8, -22.575)):
            Circle(SKETCH8_R)
    extrude(amount=-CUT_EXTRUDE6_DEPTH)


with BuildPart() as part_1:
    add(part.part)

    # Cut-Extrude6: cut by cut_extrude6_tool
    add(cut_extrude6_tool.part, mode=Mode.SUBTRACT)


with BuildPart() as body_2_1:
    add(body_2.part)

    # Cut-Extrude6: cut by cut_extrude6_tool
    add(cut_extrude6_tool.part, mode=Mode.SUBTRACT)


solid = Compound([part_1.part, body_2_1.part])
